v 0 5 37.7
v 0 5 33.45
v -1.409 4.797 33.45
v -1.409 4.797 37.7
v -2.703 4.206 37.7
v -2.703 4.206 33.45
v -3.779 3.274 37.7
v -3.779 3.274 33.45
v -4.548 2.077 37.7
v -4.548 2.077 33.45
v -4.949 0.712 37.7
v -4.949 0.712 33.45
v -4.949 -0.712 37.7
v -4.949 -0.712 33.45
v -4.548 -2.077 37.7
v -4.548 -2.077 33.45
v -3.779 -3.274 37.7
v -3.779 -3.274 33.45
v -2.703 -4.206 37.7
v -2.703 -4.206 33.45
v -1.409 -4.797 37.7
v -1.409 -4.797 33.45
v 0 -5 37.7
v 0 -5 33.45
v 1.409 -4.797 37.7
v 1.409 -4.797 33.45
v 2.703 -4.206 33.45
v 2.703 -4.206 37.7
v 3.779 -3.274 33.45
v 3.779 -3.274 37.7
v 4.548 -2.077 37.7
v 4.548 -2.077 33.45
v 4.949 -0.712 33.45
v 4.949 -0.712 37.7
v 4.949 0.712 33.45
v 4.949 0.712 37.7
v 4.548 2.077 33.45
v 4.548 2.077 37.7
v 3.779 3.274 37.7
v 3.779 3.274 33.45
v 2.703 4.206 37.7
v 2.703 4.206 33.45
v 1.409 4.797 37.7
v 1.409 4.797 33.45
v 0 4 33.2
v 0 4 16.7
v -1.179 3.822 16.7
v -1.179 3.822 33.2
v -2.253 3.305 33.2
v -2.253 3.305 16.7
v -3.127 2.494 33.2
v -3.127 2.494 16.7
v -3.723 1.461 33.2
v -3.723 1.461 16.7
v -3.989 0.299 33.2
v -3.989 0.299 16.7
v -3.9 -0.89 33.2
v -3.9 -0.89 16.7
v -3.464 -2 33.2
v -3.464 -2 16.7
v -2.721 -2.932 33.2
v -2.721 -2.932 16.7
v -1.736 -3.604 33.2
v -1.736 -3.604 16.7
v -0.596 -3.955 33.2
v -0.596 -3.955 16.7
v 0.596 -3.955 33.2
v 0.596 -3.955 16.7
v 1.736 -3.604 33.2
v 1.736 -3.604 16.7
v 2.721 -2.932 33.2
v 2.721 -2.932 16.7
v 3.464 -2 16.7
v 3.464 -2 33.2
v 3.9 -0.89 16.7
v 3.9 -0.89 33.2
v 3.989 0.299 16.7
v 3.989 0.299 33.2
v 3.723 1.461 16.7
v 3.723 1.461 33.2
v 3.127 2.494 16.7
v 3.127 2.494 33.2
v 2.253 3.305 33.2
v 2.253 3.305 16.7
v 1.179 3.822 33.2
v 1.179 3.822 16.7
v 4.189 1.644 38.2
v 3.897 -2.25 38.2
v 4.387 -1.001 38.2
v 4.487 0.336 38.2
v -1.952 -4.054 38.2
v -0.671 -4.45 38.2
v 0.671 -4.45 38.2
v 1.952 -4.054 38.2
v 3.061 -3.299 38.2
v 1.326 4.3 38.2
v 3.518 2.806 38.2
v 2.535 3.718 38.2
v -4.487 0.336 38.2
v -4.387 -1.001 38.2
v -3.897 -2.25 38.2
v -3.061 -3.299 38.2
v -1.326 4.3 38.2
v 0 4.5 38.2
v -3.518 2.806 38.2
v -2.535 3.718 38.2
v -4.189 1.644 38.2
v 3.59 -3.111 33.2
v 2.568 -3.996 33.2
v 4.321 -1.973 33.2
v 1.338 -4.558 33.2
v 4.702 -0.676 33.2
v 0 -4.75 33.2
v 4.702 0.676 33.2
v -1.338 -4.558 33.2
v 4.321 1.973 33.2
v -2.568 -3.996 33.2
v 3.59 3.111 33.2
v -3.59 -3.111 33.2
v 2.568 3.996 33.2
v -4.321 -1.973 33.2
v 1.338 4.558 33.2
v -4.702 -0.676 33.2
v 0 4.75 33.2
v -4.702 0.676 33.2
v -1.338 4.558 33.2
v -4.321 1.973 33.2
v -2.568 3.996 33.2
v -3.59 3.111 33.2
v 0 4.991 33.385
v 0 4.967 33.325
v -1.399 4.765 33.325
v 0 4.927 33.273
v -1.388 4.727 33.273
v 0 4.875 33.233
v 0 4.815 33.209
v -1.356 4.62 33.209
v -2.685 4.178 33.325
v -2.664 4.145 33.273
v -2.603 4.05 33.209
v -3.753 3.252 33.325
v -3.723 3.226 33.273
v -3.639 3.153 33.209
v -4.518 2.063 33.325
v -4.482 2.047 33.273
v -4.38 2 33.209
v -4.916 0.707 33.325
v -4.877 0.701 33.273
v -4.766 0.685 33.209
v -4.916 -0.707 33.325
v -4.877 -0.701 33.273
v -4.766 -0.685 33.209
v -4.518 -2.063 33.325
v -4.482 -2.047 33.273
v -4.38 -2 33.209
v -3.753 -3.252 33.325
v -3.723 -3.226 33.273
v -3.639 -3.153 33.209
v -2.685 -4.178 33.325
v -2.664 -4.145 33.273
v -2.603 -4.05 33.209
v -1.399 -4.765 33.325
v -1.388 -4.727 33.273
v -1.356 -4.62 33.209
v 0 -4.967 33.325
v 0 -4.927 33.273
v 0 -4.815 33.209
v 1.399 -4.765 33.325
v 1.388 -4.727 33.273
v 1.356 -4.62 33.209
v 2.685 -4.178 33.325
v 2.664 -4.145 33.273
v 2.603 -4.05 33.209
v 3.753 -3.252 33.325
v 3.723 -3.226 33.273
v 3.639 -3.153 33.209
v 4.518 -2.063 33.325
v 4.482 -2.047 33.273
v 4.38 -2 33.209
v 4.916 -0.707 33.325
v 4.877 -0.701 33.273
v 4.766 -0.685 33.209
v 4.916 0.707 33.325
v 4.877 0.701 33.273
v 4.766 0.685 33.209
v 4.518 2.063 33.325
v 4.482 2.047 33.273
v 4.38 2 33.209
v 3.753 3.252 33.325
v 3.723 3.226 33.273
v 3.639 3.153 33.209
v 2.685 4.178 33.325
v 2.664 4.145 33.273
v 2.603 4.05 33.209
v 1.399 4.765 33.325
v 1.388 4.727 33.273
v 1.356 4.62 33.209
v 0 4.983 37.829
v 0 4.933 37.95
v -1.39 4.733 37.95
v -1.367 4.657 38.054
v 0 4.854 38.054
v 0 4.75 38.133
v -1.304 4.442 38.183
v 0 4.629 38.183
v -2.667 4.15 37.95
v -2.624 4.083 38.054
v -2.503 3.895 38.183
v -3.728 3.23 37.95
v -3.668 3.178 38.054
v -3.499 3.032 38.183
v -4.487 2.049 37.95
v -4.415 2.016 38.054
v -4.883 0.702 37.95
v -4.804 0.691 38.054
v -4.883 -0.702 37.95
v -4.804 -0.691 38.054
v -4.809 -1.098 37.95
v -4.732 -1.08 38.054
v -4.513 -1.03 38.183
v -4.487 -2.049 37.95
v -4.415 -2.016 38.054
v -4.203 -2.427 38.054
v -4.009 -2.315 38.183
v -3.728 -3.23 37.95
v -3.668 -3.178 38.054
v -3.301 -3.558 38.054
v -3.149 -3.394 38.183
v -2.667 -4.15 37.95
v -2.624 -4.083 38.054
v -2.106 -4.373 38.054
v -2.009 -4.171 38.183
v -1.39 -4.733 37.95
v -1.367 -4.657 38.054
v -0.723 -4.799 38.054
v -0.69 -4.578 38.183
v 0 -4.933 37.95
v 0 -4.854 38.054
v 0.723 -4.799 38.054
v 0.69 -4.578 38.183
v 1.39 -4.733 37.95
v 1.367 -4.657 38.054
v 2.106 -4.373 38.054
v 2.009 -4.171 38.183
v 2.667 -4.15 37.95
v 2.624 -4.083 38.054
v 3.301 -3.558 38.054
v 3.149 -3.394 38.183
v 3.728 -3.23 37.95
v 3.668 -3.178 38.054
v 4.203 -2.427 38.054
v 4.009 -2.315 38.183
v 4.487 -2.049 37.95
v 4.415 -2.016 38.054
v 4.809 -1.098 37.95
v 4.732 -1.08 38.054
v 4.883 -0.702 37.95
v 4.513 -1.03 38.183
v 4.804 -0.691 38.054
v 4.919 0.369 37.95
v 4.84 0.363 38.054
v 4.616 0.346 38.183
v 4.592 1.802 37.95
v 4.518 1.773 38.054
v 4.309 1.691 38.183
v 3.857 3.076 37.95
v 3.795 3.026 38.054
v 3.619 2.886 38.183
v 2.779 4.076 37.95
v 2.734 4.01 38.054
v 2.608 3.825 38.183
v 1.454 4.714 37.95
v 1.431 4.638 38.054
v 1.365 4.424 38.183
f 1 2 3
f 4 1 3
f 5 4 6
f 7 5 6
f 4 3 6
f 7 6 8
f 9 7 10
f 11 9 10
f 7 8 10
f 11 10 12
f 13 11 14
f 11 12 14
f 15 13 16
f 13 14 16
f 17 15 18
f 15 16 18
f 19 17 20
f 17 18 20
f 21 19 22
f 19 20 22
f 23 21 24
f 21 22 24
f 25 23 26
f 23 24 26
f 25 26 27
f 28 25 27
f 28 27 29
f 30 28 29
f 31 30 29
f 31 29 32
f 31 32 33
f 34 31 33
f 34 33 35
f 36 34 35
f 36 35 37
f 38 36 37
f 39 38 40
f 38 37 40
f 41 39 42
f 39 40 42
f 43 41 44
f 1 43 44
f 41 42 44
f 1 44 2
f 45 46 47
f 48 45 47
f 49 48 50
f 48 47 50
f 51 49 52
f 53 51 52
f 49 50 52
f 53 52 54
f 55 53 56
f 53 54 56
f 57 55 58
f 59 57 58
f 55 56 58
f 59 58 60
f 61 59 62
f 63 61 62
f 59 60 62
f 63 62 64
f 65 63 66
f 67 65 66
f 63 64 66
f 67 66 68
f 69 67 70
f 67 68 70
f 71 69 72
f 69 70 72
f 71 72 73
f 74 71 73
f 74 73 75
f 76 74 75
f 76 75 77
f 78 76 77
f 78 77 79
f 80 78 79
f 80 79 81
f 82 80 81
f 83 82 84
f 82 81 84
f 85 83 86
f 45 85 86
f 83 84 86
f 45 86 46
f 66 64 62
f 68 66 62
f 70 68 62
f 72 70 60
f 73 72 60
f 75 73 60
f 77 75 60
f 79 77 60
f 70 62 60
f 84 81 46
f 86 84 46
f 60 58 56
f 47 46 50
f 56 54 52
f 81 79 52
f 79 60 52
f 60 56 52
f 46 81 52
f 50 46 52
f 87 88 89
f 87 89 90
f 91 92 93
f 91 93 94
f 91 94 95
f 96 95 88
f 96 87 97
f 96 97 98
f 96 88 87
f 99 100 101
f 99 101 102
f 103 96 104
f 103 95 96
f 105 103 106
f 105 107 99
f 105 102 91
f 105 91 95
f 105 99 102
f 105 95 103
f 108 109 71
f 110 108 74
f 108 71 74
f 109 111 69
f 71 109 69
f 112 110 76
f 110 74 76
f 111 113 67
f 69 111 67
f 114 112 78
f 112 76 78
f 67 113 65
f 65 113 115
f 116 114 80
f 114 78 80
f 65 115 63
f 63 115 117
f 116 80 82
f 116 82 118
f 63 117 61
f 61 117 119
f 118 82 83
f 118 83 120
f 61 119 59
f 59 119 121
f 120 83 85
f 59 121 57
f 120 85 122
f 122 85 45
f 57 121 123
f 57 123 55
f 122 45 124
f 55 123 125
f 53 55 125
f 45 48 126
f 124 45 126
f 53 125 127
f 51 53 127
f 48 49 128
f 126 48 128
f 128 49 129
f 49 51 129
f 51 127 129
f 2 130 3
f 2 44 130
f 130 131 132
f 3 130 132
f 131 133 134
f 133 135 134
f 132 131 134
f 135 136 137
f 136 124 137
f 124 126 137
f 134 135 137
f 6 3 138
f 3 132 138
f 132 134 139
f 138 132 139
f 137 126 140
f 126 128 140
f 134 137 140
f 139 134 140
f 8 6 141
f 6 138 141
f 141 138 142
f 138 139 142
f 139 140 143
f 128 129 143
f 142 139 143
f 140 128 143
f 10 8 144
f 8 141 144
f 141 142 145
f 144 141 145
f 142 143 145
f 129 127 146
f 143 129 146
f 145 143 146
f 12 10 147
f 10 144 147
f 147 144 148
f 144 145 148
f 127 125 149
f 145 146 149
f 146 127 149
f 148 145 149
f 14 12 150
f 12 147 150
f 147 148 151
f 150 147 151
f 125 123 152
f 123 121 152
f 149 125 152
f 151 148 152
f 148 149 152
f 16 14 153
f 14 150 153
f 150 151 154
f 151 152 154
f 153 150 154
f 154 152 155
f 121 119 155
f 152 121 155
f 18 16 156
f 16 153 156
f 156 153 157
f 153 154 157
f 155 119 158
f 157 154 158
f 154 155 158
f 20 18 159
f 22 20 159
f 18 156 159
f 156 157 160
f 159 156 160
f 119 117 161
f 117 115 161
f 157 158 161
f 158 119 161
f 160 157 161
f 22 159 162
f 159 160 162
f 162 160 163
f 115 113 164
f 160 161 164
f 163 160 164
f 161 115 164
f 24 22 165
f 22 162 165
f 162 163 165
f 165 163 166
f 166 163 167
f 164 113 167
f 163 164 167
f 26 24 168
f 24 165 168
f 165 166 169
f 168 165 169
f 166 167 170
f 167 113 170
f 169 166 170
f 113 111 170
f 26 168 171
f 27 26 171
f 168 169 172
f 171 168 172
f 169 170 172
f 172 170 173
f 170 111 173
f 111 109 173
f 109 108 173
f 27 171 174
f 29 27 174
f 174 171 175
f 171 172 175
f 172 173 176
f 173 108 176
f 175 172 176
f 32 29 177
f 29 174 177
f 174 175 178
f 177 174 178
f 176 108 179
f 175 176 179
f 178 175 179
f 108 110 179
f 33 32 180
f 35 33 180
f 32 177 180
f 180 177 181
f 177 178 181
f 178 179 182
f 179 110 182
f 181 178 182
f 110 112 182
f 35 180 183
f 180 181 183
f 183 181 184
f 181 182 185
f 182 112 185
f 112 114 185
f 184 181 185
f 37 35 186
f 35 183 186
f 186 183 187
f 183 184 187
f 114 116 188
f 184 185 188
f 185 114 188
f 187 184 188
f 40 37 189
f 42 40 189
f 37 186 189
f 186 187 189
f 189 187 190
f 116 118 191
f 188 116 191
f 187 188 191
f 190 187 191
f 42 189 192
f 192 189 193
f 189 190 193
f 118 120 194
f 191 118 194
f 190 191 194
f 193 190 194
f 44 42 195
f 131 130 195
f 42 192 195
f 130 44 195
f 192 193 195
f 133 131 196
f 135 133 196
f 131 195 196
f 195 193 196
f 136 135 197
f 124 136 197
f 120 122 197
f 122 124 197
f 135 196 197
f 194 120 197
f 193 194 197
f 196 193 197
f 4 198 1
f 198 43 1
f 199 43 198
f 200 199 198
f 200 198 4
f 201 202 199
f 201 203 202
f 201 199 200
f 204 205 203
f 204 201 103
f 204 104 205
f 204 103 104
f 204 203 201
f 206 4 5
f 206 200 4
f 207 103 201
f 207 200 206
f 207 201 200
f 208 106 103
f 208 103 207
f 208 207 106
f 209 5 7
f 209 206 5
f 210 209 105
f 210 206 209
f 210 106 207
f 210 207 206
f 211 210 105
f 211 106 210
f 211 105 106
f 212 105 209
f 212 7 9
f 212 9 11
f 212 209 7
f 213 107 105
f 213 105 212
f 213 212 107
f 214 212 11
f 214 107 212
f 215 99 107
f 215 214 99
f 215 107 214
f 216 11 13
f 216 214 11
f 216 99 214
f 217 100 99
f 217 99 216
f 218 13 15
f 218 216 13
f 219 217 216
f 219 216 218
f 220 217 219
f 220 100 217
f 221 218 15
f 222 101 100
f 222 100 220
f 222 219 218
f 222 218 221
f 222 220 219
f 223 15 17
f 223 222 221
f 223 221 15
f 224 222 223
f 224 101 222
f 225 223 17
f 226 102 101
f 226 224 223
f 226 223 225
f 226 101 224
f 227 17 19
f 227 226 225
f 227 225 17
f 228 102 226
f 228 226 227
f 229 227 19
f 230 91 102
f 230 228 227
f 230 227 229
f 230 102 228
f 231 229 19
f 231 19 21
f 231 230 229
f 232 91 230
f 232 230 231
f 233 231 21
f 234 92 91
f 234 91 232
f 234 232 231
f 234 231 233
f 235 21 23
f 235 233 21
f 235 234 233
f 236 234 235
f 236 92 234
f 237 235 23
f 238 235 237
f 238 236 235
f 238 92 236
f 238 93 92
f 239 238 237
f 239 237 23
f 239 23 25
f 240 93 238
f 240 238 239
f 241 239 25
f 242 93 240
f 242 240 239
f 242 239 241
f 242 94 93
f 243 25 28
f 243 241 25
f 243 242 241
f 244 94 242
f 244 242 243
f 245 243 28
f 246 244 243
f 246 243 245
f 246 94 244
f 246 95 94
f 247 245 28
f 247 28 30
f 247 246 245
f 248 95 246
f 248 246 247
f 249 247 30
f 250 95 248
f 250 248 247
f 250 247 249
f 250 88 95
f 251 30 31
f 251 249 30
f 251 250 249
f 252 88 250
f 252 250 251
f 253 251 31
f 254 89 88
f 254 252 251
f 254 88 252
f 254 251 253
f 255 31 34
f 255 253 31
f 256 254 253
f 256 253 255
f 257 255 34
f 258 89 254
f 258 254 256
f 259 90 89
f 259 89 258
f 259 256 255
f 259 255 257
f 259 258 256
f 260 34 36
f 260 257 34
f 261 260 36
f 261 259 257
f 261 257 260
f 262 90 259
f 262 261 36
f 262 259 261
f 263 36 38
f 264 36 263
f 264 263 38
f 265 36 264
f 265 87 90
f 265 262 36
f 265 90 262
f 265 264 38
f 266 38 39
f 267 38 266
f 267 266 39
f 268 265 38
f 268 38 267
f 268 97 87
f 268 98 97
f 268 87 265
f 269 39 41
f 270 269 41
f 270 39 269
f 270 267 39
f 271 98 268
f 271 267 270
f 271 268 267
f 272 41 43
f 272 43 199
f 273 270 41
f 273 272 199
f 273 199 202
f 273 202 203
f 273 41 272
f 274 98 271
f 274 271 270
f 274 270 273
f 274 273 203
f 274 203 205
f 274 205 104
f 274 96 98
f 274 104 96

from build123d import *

# Parameters (mm, degrees)
SKETCH019_R  = 4
PAD008_DEPTH = 16.5
SKETCH020_R  = 5
PAD009_DEPTH = 5
FILLET001_R  = 0.25
FILLET002_R  = 0.5


with BuildPart() as part:
    # Sketch019 → Pad008 (new body)
    with BuildSketch(Plane(origin=(0, 0, 16.7), x_dir=(0, 1, 0), z_dir=(0, 0, 1))):
        Circle(SKETCH019_R)
    extrude(amount=PAD008_DEPTH)

    # Sketch020 (on Face3 of Pad008) → Pad009 (join)
    with BuildSketch(Plane(origin=(0, 0, 33.2), x_dir=(0, 1, 0), z_dir=(0, 0, 1))):
        Circle(SKETCH020_R)
    extrude(amount=PAD009_DEPTH)

    # Fillet001
    fillet001_edges = [part.edges().sort_by_distance(p)[0] for p in [
        (0, -5, 33.2),
    ]]
    fillet(fillet001_edges, radius=FILLET001_R)

    # Fillet002
    fillet002_edges = [part.edges().sort_by_distance(p)[0] for p in [
        (0, -5, 38.2),
    ]]
    fillet(fillet002_edges, radius=FILLET002_R)


solid = part.part
